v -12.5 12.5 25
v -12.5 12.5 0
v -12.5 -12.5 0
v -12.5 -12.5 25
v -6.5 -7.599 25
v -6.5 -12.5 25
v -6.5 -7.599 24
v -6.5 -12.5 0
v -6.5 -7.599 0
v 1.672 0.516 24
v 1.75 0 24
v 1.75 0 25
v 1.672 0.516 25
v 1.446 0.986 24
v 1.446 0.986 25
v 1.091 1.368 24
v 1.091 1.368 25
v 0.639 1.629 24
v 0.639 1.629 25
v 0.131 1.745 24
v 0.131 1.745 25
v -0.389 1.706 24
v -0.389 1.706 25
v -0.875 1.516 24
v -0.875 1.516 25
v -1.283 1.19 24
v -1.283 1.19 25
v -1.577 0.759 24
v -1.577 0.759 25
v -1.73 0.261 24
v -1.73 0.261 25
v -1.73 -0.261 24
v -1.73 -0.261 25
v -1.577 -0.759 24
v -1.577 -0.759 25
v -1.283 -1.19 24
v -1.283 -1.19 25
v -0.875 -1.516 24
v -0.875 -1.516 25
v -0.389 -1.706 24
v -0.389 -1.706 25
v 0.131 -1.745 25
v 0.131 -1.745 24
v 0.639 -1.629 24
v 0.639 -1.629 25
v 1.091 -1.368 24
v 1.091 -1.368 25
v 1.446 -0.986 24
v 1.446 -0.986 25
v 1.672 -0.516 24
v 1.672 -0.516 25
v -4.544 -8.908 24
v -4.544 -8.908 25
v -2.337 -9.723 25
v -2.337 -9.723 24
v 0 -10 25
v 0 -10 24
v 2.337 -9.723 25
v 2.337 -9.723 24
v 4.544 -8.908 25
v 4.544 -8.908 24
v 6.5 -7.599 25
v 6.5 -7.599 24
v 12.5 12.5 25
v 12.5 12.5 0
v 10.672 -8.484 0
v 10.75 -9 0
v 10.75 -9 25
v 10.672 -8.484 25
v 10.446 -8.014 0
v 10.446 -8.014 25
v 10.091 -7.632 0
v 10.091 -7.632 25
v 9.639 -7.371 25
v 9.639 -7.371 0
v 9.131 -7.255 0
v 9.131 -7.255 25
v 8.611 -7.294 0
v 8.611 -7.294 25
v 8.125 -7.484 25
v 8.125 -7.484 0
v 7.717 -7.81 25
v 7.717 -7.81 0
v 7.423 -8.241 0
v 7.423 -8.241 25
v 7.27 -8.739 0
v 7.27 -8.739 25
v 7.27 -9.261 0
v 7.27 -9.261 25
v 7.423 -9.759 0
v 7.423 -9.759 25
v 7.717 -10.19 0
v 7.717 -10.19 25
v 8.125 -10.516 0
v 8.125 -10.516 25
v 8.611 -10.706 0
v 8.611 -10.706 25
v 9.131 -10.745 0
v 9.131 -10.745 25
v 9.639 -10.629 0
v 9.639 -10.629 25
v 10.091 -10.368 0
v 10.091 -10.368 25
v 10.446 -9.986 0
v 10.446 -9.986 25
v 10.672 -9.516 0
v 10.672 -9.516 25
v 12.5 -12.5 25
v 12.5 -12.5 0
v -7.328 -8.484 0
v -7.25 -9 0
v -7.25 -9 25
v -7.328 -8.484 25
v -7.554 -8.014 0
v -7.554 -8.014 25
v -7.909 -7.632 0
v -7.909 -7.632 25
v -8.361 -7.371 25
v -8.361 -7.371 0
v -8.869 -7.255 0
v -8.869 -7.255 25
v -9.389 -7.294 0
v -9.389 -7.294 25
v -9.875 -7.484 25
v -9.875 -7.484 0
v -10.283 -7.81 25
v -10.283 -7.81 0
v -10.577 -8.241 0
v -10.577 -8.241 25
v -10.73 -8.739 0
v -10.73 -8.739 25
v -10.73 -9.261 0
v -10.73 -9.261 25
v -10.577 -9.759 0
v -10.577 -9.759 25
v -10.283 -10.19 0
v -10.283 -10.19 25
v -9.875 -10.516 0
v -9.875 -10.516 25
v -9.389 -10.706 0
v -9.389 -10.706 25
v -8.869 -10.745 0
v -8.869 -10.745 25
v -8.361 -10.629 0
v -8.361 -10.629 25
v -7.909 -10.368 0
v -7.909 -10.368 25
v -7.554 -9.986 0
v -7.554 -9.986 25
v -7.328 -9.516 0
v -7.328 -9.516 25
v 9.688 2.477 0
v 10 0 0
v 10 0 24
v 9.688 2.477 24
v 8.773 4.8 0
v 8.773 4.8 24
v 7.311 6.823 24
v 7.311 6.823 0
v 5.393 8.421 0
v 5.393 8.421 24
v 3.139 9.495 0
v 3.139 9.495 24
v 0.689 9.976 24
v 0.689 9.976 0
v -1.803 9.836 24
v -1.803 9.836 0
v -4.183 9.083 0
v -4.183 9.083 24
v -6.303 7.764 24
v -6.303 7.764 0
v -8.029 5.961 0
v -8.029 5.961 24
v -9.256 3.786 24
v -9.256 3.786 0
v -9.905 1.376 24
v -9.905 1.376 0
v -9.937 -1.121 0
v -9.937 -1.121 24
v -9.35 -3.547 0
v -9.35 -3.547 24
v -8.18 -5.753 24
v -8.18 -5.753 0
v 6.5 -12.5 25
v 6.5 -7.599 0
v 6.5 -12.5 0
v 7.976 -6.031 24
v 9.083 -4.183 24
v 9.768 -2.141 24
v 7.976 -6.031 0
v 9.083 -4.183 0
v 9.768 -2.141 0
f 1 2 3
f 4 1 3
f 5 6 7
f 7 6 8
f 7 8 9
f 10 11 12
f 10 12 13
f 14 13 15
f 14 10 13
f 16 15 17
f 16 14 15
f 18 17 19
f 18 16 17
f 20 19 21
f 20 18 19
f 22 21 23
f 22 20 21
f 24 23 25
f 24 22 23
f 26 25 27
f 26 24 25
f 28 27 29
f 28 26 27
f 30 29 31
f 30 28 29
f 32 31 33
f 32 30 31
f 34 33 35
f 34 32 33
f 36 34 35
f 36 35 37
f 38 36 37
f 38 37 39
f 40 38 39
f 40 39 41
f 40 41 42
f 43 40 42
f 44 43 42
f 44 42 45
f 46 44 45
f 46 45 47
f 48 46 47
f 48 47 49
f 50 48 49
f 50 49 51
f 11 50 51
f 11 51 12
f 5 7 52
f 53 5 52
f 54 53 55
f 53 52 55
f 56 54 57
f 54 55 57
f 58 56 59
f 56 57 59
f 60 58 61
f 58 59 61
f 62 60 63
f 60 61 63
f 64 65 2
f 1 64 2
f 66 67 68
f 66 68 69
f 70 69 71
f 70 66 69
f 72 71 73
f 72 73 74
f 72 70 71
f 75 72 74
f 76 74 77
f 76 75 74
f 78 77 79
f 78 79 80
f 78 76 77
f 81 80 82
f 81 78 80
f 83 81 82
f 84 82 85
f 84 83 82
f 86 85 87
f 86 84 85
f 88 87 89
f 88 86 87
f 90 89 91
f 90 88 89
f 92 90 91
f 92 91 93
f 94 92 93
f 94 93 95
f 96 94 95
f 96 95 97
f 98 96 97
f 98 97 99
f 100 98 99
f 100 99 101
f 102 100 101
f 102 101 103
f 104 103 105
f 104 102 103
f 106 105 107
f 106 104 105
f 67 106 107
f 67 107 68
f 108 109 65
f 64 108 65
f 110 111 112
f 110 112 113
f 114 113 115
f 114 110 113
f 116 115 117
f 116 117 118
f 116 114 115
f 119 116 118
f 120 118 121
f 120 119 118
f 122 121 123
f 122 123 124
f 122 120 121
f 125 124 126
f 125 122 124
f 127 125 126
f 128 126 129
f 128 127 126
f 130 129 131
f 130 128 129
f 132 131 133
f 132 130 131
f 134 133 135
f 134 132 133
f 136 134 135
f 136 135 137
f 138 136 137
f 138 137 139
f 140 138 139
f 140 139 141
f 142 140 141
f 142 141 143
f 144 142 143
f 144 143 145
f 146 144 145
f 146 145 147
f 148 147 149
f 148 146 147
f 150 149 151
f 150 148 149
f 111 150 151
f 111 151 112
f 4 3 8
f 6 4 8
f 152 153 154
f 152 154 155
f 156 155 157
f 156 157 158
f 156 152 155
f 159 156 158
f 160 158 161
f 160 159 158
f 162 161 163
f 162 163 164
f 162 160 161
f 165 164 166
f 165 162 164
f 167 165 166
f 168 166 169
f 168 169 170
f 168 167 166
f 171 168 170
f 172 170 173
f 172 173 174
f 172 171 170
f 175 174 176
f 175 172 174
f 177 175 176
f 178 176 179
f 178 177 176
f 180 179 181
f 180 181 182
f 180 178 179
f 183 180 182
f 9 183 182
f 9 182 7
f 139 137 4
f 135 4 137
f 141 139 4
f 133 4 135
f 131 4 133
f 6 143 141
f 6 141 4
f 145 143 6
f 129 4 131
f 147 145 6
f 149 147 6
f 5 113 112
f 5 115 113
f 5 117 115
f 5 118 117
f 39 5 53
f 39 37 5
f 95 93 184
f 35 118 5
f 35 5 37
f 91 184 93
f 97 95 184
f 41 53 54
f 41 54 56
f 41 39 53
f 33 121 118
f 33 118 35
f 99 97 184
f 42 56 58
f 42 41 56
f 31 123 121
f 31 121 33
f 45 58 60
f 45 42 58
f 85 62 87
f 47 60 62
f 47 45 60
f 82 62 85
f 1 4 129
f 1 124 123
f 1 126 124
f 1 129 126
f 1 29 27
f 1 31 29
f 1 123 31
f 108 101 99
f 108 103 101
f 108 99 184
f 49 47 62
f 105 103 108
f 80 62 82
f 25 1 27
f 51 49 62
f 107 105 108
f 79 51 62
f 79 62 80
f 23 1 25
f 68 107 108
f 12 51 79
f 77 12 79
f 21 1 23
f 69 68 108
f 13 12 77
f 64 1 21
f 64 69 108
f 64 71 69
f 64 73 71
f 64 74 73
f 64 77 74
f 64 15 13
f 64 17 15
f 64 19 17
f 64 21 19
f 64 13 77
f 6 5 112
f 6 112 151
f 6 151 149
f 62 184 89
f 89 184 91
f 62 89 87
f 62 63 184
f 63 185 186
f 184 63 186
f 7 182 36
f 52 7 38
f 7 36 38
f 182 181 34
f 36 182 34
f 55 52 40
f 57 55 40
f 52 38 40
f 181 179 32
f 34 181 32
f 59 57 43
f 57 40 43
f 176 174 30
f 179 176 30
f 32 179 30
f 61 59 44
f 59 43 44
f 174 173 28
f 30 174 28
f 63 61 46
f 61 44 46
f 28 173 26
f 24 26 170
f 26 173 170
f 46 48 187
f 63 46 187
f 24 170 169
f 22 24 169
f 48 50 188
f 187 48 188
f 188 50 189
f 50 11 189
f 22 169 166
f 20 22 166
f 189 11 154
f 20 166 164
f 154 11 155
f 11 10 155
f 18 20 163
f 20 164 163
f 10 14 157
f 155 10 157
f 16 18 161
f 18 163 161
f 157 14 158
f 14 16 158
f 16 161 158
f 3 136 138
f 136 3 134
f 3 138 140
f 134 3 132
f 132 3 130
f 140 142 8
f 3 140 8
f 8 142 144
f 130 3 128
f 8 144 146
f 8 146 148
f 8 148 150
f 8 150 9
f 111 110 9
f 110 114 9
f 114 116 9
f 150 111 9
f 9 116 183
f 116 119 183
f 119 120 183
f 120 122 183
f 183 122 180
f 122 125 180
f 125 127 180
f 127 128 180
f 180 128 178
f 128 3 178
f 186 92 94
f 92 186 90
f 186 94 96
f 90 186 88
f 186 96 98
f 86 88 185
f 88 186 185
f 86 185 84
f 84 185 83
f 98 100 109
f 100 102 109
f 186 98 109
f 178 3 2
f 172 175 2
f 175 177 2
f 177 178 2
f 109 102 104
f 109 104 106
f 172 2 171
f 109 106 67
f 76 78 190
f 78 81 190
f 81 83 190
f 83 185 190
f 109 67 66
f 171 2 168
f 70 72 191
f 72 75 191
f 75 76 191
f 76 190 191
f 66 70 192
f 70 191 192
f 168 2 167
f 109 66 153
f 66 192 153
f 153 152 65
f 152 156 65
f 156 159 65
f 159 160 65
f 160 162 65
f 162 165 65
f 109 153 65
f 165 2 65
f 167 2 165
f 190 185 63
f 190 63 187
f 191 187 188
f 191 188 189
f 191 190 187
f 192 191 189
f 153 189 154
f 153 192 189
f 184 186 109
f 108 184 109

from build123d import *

# Parameters (mm, degrees)
F0_R     = 1.75
F1_DEPTH = 25
F2_DEPTH = 24


with BuildPart() as f1:
    # F0 (on Top) → F1 (new body)
    with BuildSketch(Plane.XY):
        with BuildLine():
            Line((6.5, -12.5), (12.5, -12.5))
            Line((12.5, -12.5), (12.5, 12.5))
            Line((12.5, 12.5), (-12.5, 12.5))
            Line((-12.5, 12.5), (-12.5, -12.5))
            Line((-12.5, -12.5), (-6.5, -12.5))
            Line((-6.5, -12.5), (-6.5, -7.5993420768))
            ThreePointArc((-6.5, -7.5993420768), (-4.1833001327, 9.0829510623), (10, 0))
            ThreePointArc((10, 0), (9.0829510623, -4.1833001327), (6.5, -7.5993420768))
            Line((6.5, -7.5993420768), (6.5, -12.5))
        make_face()
        with Locations((-9, -9)):
            Circle(F0_R, mode=Mode.SUBTRACT)
        with Locations((9, -9)):
            Circle(F0_R, mode=Mode.SUBTRACT)
        with BuildLine():
            ThreePointArc((-6.5, -7.5993420768), (0, -10), (6.5, -7.5993420768))
            ThreePointArc((6.5, -7.5993420768), (9.0829510623, -4.1833001327), (10, 0))
            ThreePointArc((10, 0), (-4.1833001327, 9.0829510623), (-6.5, -7.5993420768))
        make_face()
        Circle(F0_R, mode=Mode.SUBTRACT)
    extrude(amount=F1_DEPTH)

    # F0 (on Top) → F2 (cut)
    with BuildSketch(Plane.XY):
        with BuildLine():
            ThreePointArc((-6.5, -7.5993420768), (0, -10), (6.5, -7.5993420768))
            ThreePointArc((6.5, -7.5993420768), (9.0829510623, -4.1833001327), (10, 0))
            ThreePointArc((10, 0), (-4.1833001327, 9.0829510623), (-6.5, -7.5993420768))
        make_face()
        Circle(F0_R, mode=Mode.SUBTRACT)
    extrude(amount=F2_DEPTH, mode=Mode.SUBTRACT)


solid = f1.part
